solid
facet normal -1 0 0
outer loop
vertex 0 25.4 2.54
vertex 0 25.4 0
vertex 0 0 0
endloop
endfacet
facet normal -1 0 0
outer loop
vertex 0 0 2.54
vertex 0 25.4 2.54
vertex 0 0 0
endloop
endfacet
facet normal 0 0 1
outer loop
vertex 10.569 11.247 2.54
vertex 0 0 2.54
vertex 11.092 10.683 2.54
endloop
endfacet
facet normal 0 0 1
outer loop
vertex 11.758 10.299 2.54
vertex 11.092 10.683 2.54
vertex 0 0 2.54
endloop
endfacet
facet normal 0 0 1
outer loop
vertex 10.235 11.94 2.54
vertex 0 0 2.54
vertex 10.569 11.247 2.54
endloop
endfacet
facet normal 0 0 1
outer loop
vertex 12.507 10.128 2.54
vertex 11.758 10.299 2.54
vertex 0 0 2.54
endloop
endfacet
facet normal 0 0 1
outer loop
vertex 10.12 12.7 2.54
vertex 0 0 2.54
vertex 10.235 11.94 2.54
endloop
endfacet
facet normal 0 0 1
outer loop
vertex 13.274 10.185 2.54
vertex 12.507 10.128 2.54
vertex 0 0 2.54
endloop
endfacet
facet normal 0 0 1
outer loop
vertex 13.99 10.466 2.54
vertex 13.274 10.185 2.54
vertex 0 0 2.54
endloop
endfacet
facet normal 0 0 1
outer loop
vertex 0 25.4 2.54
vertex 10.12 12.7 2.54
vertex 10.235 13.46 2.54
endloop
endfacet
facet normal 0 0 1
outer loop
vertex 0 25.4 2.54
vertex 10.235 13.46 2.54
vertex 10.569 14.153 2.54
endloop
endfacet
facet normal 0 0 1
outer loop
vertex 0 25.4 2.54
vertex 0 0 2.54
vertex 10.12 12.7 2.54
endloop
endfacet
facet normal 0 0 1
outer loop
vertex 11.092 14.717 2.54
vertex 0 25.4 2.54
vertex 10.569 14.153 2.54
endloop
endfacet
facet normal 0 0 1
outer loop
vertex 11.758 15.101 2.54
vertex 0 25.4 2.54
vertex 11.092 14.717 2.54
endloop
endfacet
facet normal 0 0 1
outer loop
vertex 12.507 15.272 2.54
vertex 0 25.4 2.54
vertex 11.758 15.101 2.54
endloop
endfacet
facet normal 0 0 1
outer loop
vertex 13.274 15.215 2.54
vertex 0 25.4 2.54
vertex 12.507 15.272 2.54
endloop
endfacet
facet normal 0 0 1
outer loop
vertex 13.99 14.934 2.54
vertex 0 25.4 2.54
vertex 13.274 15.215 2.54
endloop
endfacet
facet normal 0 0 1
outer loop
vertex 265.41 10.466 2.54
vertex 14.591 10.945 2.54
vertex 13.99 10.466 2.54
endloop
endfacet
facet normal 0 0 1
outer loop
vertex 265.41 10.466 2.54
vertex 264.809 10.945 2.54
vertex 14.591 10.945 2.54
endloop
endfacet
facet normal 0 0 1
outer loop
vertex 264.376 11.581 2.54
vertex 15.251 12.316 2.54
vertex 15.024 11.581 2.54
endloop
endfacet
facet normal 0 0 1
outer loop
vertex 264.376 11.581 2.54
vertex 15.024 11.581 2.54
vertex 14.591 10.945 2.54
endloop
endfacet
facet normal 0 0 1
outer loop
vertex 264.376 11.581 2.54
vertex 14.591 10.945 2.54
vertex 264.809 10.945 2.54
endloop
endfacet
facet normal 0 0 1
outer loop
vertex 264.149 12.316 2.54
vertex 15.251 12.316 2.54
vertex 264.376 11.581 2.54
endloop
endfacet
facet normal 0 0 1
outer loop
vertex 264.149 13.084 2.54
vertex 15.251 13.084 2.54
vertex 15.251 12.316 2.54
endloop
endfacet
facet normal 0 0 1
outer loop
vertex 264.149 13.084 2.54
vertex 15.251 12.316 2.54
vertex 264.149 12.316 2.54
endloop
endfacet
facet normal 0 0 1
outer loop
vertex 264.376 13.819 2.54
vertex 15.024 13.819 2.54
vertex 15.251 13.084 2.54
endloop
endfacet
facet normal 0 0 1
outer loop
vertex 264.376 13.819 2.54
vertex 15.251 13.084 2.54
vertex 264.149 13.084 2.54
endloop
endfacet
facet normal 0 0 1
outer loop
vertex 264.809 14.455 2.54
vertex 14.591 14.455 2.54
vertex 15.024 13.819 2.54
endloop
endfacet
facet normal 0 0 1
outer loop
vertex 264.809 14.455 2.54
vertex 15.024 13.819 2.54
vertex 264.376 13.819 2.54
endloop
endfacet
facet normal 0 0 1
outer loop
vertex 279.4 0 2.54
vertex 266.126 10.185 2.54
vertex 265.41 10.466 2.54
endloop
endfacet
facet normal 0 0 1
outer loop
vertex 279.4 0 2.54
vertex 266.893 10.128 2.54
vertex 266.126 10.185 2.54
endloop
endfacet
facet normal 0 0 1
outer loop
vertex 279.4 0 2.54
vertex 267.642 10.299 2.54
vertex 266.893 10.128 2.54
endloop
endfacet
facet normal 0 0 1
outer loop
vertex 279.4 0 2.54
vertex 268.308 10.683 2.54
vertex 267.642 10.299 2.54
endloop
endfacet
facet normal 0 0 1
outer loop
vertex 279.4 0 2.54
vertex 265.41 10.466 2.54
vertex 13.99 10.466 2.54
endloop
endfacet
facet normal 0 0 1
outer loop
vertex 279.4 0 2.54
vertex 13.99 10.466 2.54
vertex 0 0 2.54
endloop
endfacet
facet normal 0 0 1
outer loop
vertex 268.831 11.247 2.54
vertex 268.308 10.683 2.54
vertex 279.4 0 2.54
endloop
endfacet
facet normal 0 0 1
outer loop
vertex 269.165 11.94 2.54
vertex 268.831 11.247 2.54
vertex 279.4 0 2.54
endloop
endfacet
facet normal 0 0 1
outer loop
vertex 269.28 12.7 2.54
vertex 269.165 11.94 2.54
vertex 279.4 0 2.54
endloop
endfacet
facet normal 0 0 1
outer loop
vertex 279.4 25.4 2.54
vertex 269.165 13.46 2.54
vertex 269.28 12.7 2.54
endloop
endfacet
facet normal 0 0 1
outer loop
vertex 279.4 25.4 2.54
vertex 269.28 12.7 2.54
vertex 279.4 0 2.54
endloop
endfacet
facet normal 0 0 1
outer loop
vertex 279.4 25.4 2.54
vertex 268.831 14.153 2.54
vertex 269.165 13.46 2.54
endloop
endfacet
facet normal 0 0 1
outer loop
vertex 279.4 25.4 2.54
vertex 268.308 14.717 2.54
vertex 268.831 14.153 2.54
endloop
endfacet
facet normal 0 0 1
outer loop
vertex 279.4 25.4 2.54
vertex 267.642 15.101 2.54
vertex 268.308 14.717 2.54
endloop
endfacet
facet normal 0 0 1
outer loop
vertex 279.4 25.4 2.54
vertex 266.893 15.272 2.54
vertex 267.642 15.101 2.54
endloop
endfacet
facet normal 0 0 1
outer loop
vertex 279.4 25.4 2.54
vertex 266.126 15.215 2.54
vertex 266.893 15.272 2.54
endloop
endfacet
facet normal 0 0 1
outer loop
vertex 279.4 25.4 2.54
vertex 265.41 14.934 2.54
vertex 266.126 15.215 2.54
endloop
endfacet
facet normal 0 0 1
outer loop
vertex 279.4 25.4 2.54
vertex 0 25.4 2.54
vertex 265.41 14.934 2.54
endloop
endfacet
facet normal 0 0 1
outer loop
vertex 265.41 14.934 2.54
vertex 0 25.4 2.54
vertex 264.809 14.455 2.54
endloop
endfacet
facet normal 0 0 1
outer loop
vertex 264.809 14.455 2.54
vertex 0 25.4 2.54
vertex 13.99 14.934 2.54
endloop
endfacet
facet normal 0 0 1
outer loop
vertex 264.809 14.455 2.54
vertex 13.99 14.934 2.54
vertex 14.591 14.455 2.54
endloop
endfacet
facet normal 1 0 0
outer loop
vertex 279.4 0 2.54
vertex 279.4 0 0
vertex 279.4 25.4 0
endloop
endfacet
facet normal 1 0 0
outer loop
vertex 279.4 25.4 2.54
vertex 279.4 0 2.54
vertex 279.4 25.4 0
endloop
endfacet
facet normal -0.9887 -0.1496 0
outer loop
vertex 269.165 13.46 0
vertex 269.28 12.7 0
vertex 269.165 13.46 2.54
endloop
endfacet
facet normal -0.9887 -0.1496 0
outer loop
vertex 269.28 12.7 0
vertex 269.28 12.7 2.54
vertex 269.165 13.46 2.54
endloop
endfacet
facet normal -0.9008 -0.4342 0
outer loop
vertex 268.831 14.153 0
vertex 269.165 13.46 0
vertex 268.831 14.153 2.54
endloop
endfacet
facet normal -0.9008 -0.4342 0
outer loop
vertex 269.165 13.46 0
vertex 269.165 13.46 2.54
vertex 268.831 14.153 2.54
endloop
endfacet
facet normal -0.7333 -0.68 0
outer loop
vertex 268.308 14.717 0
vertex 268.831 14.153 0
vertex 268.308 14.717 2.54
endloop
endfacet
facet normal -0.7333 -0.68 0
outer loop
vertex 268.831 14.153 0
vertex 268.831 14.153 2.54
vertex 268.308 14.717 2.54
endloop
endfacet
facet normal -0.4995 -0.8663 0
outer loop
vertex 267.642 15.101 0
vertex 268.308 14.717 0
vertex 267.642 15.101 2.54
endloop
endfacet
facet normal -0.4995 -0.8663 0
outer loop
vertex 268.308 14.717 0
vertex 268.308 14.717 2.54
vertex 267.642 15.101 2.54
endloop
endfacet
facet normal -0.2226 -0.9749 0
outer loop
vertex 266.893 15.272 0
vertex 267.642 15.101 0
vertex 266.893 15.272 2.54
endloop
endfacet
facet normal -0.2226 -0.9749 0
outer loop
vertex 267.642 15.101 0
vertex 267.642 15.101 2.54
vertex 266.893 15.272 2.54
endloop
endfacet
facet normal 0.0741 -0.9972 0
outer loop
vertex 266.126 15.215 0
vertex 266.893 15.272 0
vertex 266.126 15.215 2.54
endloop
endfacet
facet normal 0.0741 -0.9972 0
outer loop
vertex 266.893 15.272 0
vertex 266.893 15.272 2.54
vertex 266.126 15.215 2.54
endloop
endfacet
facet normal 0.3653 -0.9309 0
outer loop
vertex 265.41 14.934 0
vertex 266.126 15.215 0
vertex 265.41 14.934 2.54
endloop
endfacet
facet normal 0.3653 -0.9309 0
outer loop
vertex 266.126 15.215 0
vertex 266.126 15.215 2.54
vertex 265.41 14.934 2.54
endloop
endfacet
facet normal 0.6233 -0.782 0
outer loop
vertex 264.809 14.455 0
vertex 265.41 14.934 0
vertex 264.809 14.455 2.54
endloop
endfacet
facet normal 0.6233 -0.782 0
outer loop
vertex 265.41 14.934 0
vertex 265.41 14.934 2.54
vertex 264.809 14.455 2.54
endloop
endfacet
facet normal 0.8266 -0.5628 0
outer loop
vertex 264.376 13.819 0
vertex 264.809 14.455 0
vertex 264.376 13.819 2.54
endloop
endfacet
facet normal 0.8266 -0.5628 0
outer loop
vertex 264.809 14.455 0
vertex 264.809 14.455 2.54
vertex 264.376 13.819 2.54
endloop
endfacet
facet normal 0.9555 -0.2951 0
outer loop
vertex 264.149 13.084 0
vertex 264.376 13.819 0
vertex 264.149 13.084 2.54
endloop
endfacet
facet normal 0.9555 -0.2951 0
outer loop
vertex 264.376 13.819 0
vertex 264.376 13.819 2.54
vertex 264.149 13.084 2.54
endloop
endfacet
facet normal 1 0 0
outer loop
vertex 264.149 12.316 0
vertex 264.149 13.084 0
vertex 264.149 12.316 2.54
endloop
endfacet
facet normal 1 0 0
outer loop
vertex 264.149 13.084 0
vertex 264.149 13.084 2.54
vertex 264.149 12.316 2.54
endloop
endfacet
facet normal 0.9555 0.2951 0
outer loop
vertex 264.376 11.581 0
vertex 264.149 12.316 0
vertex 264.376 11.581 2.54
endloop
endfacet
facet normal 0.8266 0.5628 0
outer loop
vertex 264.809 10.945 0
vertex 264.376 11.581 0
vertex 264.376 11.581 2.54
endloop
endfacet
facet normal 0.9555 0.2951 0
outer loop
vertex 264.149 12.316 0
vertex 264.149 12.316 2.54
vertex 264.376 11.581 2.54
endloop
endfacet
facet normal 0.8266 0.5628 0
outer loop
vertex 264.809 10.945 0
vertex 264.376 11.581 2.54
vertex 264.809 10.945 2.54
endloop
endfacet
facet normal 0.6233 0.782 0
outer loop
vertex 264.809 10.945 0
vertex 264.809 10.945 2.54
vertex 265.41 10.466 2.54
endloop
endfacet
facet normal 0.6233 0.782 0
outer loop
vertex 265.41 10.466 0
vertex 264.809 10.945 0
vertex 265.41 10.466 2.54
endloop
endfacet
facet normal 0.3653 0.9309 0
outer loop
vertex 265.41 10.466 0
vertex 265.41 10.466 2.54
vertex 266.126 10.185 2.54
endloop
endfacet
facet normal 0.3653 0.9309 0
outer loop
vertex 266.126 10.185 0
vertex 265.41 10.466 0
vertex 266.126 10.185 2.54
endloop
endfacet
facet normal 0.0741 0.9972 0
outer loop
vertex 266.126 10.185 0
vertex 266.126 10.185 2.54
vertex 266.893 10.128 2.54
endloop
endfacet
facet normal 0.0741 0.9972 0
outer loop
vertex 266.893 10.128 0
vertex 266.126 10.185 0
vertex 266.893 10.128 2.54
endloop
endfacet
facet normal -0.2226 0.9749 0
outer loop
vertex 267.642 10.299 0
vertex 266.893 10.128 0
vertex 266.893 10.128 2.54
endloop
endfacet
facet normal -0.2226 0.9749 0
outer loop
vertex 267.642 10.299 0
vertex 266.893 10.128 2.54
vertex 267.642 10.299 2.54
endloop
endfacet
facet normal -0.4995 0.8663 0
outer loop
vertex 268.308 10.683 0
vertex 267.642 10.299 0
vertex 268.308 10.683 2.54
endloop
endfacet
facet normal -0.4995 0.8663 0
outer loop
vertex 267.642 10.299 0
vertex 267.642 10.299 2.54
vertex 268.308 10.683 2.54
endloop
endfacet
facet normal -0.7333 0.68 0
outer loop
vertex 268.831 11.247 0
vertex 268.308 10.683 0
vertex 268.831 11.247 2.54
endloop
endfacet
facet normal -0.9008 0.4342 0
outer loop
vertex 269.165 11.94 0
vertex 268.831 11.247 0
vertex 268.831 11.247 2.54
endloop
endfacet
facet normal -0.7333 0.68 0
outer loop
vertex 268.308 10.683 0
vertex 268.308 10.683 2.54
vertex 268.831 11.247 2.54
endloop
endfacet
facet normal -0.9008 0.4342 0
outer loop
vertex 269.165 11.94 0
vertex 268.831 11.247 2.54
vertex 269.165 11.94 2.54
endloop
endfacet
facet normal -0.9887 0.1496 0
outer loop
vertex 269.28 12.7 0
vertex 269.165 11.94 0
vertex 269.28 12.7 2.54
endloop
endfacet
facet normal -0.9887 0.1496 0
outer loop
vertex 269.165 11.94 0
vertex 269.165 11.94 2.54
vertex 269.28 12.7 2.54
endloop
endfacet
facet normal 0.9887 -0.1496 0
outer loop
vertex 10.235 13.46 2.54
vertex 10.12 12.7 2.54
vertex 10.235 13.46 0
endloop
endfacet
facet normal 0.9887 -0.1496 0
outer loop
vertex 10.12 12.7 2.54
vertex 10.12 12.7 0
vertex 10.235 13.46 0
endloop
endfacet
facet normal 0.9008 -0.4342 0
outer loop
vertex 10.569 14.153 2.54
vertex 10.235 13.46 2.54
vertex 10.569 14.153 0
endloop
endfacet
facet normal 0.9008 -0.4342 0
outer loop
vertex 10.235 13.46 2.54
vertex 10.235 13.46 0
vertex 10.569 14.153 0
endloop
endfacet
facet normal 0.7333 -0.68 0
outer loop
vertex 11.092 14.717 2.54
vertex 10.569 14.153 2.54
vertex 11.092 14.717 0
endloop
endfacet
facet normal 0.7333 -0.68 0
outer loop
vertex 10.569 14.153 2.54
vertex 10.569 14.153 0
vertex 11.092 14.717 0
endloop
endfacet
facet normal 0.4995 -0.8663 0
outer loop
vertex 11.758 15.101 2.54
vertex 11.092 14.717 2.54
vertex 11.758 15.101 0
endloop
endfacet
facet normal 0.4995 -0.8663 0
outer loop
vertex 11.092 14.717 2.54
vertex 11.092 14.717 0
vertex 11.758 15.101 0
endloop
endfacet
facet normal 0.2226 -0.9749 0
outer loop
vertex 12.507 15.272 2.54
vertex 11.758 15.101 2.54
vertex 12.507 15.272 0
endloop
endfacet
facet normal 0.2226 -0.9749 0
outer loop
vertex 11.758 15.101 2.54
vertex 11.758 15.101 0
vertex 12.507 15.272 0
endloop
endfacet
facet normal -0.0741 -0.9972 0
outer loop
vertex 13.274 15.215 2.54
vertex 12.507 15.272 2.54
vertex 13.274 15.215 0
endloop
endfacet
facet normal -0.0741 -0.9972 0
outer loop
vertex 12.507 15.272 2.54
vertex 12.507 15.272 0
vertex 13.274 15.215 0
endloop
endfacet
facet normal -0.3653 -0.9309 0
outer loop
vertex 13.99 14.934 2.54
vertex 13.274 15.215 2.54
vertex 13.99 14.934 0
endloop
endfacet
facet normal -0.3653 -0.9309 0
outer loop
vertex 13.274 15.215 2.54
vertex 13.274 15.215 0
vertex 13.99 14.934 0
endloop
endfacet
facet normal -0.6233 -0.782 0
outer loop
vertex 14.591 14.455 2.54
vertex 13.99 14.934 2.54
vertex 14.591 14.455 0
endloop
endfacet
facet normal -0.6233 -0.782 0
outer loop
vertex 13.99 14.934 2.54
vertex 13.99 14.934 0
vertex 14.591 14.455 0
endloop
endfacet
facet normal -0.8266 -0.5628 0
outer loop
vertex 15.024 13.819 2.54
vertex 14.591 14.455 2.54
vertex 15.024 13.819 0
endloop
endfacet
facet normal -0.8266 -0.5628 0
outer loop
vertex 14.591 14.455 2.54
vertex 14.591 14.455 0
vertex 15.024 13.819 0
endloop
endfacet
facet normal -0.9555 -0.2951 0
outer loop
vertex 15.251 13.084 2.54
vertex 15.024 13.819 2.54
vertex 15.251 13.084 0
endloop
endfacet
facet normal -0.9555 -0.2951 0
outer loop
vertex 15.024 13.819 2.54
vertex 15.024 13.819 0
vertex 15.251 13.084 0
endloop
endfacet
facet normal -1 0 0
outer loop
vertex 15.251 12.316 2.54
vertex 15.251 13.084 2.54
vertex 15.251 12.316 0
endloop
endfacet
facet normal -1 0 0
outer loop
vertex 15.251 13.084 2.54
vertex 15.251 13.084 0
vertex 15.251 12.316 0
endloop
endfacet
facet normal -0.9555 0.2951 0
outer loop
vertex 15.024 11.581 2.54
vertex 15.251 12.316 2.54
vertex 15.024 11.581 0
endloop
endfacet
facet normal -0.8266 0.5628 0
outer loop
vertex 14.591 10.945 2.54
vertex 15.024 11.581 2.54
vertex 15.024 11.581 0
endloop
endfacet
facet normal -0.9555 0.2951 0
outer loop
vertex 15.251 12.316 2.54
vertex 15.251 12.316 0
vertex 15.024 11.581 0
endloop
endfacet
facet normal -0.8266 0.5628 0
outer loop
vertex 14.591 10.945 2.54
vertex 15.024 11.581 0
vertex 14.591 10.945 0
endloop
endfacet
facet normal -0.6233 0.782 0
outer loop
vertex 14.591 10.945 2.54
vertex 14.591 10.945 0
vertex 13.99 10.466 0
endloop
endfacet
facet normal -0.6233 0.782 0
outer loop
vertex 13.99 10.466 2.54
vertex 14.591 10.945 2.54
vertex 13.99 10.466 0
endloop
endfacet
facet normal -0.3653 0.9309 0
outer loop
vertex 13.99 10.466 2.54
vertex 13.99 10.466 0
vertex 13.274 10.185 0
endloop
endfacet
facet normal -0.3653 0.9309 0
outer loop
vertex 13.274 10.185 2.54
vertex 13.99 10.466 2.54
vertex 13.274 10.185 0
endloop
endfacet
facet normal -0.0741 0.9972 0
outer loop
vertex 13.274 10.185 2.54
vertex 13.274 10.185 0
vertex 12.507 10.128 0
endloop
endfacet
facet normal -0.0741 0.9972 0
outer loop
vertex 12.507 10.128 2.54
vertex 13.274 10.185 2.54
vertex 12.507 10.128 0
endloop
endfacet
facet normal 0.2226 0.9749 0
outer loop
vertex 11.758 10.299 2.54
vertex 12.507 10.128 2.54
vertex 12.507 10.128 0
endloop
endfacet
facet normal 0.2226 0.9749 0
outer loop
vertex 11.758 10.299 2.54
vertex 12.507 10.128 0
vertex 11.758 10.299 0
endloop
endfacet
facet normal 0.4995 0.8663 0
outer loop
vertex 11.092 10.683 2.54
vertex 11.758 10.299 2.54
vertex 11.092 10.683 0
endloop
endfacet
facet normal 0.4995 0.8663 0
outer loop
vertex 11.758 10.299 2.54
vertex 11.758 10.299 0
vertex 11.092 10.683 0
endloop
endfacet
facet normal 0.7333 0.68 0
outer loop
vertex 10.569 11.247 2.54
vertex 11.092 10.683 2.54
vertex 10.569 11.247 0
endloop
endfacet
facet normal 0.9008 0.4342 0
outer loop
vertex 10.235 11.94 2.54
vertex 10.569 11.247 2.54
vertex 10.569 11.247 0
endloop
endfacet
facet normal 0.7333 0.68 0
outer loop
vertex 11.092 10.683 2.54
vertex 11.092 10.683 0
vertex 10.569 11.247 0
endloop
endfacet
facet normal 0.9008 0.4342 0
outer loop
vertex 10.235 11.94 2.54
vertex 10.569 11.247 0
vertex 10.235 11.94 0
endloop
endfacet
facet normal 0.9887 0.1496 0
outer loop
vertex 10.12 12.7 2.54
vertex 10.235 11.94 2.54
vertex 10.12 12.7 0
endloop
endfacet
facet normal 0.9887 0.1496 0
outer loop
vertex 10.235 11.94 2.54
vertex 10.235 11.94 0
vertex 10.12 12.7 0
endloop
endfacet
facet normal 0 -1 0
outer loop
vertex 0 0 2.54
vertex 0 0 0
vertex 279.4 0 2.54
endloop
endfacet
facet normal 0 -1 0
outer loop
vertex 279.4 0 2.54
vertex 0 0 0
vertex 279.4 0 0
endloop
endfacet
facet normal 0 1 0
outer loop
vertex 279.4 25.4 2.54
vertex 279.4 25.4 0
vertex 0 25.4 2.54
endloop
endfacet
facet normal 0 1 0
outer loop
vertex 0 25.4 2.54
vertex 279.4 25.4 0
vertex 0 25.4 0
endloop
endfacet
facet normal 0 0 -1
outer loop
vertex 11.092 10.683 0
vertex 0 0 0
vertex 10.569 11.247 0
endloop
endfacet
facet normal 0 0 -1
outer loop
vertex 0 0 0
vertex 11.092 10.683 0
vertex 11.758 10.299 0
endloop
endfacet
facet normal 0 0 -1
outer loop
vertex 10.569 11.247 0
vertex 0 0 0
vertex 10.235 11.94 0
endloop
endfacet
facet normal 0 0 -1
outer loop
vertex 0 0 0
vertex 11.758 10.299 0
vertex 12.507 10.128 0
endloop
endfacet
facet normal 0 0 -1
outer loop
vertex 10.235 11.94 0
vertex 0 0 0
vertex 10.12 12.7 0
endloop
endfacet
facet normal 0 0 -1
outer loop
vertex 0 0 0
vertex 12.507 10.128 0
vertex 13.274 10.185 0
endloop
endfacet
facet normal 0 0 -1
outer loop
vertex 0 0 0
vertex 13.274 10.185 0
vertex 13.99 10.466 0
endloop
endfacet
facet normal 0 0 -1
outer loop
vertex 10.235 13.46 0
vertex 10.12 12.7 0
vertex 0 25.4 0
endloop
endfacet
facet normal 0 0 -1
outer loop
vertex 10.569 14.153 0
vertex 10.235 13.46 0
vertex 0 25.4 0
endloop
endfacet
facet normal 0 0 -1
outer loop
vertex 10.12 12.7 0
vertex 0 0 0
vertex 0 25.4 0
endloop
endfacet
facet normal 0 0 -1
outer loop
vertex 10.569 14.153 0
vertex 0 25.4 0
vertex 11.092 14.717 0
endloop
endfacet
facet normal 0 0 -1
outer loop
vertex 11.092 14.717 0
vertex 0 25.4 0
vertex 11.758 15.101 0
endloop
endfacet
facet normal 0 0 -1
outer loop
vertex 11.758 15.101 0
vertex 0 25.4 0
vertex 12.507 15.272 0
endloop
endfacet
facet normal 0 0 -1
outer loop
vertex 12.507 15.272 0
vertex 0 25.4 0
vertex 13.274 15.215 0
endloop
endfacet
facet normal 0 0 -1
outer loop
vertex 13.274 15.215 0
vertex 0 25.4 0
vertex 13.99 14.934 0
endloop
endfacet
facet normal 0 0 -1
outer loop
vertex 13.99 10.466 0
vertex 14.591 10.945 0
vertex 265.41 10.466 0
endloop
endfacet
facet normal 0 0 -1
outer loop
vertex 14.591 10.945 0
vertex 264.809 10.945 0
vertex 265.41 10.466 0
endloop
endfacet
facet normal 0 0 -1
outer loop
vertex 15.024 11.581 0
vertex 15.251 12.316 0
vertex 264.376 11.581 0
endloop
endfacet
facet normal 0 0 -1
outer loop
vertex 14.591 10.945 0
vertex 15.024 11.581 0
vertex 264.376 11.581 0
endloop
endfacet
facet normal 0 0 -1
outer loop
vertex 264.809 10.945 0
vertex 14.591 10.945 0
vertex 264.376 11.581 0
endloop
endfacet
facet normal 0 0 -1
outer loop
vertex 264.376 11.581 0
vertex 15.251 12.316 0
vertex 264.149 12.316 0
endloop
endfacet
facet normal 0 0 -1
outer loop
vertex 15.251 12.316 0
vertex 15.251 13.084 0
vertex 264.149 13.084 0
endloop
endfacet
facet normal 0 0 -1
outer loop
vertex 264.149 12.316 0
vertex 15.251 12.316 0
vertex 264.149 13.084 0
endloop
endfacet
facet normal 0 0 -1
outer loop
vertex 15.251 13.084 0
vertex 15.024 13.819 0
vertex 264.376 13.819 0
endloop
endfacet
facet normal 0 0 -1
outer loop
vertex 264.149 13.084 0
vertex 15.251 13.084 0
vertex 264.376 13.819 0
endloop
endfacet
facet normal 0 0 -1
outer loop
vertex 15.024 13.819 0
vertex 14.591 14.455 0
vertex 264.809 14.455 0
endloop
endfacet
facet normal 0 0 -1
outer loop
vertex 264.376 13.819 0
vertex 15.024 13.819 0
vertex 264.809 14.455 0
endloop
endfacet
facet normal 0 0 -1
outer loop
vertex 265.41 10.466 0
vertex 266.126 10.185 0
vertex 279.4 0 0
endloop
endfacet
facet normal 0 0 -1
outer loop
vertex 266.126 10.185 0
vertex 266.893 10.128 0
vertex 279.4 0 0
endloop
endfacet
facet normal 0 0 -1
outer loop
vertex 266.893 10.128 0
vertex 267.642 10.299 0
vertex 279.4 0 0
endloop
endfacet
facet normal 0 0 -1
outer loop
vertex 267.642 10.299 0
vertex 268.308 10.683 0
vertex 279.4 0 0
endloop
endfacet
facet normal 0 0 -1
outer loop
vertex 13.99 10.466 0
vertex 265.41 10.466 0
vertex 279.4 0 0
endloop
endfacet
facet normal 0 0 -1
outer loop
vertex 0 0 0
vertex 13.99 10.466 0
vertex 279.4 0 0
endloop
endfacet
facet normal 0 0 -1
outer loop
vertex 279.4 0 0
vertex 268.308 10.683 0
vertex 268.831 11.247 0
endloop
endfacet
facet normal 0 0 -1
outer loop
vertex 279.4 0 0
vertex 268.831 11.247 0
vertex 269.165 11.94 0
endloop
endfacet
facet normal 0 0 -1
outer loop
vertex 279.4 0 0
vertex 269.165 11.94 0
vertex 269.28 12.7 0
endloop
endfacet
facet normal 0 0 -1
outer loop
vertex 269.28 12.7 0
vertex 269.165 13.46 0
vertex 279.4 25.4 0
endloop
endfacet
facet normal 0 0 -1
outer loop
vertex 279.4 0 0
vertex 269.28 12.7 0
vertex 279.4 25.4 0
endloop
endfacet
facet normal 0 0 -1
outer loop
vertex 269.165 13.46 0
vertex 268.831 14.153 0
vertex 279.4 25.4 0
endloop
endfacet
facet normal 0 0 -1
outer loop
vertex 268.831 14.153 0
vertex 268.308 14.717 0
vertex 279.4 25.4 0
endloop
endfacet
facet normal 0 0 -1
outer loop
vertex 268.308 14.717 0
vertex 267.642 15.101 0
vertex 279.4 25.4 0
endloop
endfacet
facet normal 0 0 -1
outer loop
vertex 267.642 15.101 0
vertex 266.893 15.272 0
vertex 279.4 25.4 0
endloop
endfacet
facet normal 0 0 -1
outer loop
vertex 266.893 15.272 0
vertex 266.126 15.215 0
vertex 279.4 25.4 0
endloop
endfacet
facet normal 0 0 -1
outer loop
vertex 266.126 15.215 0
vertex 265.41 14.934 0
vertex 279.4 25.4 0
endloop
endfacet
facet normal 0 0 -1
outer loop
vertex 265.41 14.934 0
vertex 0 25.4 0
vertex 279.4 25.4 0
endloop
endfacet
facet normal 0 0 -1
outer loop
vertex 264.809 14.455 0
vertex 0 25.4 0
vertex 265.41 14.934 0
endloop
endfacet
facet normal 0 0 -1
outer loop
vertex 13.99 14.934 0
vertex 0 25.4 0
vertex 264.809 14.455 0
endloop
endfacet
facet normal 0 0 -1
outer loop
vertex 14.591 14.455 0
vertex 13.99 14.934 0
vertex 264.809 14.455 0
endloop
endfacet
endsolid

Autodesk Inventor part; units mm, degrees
ref_plane "YZ Plane" through (0, 0, 0) normal (1, 0, 0) x (0, 1, 0)
ref_plane "XZ Plane" through (0, 0, 0) normal (0, 1, 0) x (-1, 0, 0)
ref_plane "XY Plane" through (0, 0, 0) normal (0, 0, 1) x (1, 0, 0)
sketch "Sketch1" plane through (0, 0, 0) normal (0, 0, 1) x (1, 0, 0)
  line L0 (0, 0) -> (279.4, 0)
  line L1 (279.4, 0) -> (279.4, 25.4)
  line L2 (279.4, 25.4) -> (0, 25.4)
  line L3 (0, 25.4) -> (0, 0)
  dimension "d2" = 279.4
  dimension "d3" = 25.4
extrude "Extrusion1" add sketch "Sketch1" along normal blind 2.54
sketch "Sketch2" plane through (0, 0, 0) normal (0, 0, -1) x (-1, 0, 0)
  circle A0 centre (-12.7, 12.7) radius 2.5797
  line L0 (0, 25.4) -> (0, 0) projected
  line L1 (0, 0) -> (-279.4, 0) projected
  dimension "d6" = 5.1594
  dimension "d7" = 12.7
  dimension "d8" = 12.7
extrude "Extrusion2" cut sketch "Sketch2" against normal blind 25.4
sketch "Sketch3" plane through (0, 0, 2.54) normal (0, 0, 1) x (1, 0, 0)
  circle A0 centre (266.7, 12.7) radius 2.5797
  line L0 (279.4, 0) -> (279.4, 25.4) projected
  line L1 (0, 0) -> (279.4, 0) projected
  dimension "d11" = 5.1594
  dimension "d12" = 12.7
  dimension "d13" = 12.7
extrude "Extrusion3" cut sketch "Sketch3" against normal blind 25.4
properties part number "supports"
